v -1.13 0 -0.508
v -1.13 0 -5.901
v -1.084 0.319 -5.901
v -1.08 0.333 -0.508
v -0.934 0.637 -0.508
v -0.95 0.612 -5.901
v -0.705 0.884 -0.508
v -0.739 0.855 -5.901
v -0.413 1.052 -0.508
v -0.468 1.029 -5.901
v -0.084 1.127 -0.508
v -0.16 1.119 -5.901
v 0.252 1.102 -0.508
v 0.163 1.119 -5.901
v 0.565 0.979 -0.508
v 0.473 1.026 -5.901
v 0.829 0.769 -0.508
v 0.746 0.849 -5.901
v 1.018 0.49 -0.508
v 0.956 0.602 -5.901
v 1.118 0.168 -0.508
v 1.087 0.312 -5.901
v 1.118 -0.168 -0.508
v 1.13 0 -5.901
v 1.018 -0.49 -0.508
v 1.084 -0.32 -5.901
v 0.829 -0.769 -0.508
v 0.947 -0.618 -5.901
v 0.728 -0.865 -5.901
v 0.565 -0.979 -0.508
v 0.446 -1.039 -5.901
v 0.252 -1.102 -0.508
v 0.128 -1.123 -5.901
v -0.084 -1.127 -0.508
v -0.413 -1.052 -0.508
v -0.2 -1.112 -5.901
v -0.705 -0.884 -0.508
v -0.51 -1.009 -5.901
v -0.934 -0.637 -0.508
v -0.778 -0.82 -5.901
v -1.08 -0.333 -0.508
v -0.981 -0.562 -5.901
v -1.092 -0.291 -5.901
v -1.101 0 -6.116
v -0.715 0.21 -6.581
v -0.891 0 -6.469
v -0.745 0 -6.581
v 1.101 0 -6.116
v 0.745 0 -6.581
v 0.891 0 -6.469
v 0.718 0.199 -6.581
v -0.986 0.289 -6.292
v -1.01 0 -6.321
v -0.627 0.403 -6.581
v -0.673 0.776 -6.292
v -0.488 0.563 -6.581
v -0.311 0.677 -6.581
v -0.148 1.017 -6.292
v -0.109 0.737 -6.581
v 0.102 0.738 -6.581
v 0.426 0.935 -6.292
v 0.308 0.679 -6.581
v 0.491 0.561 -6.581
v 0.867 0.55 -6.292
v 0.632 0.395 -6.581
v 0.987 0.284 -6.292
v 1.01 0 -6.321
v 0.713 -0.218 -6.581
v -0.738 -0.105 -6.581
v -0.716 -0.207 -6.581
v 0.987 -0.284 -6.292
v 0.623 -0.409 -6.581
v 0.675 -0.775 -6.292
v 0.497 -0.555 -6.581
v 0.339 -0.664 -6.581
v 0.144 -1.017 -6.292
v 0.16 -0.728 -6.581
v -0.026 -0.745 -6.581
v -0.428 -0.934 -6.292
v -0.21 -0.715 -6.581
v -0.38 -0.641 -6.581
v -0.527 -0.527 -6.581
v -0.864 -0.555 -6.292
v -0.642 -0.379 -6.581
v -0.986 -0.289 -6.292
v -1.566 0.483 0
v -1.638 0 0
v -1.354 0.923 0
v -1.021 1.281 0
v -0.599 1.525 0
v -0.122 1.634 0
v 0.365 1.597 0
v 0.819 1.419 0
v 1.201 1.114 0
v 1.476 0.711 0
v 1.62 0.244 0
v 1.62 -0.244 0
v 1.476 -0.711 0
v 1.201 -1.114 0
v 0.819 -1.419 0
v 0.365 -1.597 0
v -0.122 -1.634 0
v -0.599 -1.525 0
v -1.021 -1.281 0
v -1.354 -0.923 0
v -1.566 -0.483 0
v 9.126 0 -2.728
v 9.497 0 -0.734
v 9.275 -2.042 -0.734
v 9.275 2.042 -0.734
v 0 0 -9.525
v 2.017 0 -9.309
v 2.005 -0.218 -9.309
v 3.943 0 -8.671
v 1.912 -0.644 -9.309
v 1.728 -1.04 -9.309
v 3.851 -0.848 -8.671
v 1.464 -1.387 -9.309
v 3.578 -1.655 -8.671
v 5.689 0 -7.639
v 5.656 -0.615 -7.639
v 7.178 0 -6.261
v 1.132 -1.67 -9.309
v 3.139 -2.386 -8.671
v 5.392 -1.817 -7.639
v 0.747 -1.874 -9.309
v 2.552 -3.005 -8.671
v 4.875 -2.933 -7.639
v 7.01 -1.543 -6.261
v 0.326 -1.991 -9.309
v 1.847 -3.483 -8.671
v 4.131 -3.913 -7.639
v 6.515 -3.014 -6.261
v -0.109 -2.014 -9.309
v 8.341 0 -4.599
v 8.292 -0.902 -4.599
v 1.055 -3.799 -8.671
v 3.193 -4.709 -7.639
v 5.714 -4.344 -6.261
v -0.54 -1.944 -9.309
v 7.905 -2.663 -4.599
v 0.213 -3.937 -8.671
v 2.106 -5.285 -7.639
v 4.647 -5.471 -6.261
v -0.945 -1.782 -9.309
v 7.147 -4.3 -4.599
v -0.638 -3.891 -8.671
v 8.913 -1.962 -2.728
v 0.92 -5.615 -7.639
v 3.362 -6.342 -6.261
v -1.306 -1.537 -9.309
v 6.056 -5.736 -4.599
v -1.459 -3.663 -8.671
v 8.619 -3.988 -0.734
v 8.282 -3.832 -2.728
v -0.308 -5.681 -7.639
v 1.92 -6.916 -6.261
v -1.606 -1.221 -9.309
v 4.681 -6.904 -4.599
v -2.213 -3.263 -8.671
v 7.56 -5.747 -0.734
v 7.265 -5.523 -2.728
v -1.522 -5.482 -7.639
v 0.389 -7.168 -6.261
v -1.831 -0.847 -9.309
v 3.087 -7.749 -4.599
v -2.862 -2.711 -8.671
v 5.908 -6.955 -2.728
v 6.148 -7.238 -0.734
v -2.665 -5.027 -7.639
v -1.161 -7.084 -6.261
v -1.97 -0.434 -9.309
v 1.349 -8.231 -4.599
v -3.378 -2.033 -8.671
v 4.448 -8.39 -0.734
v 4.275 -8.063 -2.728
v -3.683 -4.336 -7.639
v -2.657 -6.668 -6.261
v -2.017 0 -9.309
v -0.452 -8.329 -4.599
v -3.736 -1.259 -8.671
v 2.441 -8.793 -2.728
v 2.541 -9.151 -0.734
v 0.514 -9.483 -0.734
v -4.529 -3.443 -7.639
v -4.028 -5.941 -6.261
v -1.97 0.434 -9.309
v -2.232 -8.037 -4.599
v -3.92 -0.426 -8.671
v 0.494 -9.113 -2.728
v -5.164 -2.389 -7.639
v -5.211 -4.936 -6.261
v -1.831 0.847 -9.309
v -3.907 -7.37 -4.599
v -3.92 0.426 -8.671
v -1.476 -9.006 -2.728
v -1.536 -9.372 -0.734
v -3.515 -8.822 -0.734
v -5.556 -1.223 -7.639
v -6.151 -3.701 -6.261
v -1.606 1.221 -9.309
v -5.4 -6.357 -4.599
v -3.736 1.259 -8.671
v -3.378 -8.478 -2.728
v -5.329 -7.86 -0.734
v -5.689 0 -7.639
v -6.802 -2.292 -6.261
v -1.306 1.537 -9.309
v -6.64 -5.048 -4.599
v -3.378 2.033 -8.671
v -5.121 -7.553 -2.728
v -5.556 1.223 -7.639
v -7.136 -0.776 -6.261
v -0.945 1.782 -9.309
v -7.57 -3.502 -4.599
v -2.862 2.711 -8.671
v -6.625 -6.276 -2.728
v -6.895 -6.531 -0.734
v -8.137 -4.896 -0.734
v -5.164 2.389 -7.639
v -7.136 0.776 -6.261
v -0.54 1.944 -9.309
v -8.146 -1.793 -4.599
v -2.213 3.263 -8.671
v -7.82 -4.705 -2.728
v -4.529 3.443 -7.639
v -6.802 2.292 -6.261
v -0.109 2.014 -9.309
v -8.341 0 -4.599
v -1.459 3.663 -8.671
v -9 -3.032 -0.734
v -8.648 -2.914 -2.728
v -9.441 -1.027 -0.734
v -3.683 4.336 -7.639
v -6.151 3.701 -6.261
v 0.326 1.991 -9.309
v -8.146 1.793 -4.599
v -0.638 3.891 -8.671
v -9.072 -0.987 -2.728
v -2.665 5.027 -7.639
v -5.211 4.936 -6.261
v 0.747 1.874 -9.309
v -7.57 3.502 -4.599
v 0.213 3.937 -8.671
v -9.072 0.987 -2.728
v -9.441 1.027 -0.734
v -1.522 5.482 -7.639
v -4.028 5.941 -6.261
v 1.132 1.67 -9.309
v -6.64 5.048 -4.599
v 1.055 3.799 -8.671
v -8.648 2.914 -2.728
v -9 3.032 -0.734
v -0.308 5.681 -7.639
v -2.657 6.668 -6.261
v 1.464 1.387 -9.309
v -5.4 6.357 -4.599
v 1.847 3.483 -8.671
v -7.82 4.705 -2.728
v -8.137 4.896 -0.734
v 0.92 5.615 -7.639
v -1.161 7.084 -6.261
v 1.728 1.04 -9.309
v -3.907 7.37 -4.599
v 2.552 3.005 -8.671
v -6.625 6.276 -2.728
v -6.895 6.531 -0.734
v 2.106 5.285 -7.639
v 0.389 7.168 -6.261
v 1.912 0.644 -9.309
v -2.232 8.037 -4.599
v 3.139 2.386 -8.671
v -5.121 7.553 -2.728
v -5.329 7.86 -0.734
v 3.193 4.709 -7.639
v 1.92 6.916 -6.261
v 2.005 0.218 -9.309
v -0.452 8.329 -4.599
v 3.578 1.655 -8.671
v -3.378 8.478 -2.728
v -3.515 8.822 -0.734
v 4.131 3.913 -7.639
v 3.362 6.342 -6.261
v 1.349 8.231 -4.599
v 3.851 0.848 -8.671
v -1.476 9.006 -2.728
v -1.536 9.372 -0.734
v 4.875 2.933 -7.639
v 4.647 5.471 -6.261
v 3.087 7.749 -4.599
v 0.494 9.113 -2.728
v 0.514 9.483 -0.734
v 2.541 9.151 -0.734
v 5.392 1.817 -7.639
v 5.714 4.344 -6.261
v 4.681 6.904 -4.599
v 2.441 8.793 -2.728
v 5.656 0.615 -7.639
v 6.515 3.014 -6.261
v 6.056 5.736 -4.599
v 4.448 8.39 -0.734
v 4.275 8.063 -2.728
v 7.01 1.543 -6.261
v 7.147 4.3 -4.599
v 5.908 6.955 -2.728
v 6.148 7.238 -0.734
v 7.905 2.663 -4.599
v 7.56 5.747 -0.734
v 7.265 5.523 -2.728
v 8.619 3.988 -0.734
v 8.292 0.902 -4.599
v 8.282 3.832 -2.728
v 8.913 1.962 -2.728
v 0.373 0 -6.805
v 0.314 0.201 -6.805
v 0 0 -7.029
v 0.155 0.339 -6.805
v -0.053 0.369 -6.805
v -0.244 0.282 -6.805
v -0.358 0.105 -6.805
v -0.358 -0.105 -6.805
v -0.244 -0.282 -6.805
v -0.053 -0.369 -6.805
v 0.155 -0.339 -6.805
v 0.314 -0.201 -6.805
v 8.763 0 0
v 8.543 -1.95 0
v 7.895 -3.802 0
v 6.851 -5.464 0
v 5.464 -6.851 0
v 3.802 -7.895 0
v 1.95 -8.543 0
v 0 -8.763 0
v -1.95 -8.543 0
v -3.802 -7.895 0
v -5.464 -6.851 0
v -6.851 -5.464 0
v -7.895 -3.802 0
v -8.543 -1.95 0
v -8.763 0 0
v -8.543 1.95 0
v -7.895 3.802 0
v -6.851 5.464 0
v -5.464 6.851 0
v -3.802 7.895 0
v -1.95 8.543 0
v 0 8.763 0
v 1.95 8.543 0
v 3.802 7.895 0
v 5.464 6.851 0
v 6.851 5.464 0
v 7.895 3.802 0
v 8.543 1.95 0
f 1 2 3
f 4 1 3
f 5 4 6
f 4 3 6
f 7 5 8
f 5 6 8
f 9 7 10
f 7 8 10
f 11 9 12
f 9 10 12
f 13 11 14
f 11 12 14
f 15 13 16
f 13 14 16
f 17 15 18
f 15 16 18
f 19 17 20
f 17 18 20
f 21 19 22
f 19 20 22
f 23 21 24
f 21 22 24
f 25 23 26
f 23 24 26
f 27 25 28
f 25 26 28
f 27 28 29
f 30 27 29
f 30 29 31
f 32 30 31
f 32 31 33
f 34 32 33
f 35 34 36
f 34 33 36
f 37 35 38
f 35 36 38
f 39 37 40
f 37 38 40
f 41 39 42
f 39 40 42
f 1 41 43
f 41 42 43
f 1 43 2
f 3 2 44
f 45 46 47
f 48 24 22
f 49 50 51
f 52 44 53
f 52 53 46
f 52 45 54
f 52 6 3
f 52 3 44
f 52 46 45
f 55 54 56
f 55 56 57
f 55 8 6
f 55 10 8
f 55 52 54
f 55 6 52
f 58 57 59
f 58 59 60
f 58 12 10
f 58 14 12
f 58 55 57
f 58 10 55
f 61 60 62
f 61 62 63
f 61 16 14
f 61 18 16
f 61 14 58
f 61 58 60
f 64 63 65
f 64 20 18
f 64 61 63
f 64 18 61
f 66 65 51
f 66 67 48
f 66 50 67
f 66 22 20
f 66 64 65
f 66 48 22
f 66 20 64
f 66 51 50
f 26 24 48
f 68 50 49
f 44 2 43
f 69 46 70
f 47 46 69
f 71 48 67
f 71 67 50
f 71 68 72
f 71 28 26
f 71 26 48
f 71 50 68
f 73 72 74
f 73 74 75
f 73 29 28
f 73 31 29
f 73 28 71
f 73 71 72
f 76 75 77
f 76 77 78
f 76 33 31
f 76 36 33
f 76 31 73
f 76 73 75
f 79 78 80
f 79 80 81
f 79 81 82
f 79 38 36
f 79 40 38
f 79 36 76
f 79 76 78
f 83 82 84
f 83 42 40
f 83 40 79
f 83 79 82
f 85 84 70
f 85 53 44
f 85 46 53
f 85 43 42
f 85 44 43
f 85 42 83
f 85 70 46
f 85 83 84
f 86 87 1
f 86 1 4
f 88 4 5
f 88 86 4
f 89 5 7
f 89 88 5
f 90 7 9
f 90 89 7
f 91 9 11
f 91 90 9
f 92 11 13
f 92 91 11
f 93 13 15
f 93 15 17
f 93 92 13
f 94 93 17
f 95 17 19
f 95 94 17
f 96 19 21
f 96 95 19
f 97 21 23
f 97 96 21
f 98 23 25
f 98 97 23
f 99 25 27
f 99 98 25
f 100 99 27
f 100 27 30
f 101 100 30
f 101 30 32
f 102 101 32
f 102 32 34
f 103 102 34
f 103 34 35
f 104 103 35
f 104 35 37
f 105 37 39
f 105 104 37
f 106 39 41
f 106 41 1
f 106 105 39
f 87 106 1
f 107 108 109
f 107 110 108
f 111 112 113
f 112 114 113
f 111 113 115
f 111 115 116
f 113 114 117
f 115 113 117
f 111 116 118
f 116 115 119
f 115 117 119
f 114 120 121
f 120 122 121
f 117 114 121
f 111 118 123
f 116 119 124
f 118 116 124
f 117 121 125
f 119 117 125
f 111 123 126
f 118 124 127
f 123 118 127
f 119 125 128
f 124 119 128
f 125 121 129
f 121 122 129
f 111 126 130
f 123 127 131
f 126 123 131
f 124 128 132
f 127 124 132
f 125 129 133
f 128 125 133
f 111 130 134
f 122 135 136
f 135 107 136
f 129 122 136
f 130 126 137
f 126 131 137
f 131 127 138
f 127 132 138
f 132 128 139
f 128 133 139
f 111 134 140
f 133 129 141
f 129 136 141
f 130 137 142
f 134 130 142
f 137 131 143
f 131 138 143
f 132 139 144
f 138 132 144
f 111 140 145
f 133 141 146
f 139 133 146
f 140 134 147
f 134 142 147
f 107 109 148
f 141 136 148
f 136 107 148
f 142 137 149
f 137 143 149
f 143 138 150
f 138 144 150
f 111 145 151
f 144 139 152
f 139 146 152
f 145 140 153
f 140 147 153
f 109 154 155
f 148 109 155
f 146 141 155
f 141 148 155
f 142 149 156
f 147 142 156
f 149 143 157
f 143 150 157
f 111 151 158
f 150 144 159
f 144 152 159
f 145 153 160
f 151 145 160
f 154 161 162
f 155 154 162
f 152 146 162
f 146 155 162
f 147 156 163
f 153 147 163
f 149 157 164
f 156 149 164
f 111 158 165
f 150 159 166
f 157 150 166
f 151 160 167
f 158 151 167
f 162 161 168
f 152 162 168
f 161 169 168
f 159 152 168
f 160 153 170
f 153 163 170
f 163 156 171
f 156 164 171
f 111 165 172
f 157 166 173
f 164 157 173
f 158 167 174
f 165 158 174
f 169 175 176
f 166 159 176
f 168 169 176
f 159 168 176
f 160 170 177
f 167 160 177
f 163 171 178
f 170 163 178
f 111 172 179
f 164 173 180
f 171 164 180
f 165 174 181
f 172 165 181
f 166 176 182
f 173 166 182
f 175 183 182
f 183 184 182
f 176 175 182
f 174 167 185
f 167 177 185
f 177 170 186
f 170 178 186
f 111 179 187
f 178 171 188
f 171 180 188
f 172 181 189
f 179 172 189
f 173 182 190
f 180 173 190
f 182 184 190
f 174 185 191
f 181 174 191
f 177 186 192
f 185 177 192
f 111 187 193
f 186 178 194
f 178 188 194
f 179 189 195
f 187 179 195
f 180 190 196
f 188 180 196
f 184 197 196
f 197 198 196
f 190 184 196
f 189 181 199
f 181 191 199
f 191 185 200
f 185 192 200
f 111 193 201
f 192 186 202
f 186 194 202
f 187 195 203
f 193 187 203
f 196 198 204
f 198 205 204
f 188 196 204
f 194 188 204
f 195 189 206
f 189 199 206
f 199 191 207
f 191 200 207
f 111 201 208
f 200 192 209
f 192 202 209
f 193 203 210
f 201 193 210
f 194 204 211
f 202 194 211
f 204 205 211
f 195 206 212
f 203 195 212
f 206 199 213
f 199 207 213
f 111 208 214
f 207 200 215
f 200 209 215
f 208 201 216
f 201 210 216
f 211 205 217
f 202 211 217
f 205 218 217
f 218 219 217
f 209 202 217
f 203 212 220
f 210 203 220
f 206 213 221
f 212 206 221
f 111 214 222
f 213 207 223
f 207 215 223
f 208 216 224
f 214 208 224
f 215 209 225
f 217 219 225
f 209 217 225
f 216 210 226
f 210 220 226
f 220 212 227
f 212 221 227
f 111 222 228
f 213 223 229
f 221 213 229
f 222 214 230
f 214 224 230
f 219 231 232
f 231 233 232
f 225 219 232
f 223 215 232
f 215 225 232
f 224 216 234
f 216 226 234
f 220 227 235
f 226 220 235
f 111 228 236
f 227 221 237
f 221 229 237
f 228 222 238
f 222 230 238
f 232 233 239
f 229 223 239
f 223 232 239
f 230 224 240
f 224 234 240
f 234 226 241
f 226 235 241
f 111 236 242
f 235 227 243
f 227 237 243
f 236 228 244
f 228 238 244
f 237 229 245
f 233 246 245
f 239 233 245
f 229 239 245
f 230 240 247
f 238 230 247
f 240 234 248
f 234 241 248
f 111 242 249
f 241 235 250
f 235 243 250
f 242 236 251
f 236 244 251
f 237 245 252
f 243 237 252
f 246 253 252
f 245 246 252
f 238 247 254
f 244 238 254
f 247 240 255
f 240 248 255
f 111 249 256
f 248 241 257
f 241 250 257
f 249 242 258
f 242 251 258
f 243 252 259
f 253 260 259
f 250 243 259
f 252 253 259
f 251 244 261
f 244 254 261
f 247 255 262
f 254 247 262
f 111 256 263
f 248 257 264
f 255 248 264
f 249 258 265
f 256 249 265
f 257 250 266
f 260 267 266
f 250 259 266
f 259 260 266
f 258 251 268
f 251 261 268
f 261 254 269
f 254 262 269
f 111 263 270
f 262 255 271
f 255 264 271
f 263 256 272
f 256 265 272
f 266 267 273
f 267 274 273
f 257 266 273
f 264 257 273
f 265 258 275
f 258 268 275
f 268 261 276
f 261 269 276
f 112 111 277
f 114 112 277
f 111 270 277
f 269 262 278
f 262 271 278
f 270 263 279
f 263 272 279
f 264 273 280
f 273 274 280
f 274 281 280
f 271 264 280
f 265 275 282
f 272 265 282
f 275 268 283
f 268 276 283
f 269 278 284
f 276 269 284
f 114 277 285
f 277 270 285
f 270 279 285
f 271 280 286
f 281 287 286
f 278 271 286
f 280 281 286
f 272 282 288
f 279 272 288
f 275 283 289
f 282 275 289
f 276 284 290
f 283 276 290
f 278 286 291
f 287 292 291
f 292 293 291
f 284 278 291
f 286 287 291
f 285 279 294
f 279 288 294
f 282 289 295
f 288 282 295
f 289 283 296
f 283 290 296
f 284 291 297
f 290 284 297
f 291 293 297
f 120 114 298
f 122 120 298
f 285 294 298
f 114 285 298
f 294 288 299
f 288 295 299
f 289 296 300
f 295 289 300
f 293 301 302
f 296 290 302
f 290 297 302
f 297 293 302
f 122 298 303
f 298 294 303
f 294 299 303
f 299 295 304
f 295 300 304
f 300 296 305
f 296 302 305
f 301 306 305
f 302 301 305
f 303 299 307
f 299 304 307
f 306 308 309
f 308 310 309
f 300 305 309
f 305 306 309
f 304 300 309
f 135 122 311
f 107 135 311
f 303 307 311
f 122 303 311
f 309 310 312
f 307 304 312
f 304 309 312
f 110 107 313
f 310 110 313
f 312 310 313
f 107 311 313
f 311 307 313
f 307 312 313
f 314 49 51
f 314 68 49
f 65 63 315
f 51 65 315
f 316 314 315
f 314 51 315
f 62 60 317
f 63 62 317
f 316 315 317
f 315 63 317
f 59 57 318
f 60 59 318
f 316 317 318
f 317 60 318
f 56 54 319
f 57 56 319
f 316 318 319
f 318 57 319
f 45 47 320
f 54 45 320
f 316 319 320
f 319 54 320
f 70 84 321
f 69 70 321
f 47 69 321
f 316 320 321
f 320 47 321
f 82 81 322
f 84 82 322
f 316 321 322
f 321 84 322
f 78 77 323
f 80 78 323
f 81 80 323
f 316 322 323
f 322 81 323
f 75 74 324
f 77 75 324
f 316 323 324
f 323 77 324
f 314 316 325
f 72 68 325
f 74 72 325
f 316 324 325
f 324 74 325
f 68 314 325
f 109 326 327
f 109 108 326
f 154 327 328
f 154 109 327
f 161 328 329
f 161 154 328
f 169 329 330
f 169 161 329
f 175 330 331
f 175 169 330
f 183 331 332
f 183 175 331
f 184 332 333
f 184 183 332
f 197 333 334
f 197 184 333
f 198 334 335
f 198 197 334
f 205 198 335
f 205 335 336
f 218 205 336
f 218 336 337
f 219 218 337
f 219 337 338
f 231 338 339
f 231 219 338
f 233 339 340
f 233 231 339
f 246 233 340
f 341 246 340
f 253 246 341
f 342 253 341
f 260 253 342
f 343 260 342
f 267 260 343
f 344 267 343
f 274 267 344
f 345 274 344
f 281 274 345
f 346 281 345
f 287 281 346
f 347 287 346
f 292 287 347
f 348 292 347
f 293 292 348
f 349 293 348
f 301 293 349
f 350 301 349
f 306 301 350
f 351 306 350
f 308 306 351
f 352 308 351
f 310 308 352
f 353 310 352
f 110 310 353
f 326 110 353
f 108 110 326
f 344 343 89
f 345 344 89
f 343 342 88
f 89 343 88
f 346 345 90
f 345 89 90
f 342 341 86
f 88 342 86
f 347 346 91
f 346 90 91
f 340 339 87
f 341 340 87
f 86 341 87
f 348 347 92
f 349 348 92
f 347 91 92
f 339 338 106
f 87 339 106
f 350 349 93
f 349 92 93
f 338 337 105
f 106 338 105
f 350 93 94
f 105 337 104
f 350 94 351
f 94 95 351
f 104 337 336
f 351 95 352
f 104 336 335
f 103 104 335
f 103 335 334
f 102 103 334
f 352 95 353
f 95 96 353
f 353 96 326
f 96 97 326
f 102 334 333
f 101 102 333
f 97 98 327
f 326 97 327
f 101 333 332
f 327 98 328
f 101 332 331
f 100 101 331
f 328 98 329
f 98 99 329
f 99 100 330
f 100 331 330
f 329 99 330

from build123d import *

# Parameters (mm, degrees)
F_4_40_TAPPED_HOLE1_D     = 2.2606
F_4_40_TAPPED_HOLE1_DEPTH = 6.35
F_4_40_TAPPED_HOLE1_TIP   = 0.679152758
FILLET1_R                 = 0.79375
CHAMFER1_SIZE             = 0.762
CHAMFER2_SIZE             = 0.508


with BuildPart() as part:
    # Sketch1 → Revolve1 (revolve)
    with BuildSketch(Plane(origin=(0, 0, 0), x_dir=(1, 0, 0), z_dir=(0, 1, 0))):
        with BuildLine():
            Line((0, 0), (0, 9.525))
            ThreePointArc((0, 9.525), (6.735192091, 6.735192091), (9.525, 0))
            Line((9.525, 0), (0, 0))
        make_face()
    revolve(axis=Axis((0, 0, 0), (0, 0, -1)))

    # #4-40 Tapped Hole1
    with Locations(Plane.XY):
        with Locations((0, 0)):
            Hole(F_4_40_TAPPED_HOLE1_D / 2, depth=F_4_40_TAPPED_HOLE1_DEPTH)
            with Locations((0, 0, -(F_4_40_TAPPED_HOLE1_DEPTH + F_4_40_TAPPED_HOLE1_TIP / 2))):  # 118° drill point
                Cone(0, F_4_40_TAPPED_HOLE1_D / 2, F_4_40_TAPPED_HOLE1_TIP, mode=Mode.SUBTRACT)

    # Fillet1
    fillet1_edges = [part.edges().sort_by_distance(p)[0] for p in [
        (0, 1.1303, -6.35),
    ]]
    fillet(fillet1_edges, radius=FILLET1_R)

    # Chamfer1
    # the kernel refuses this chamfer: 0.762 mm, written as the material it takes off along each edge
    with BuildSketch(Plane(origin=(0, 0, 0), x_dir=(1, 0, 0), z_dir=(0, 1, 0))) as chamfer1_piece_1:
        with BuildLine():
            Line((9.525 - CHAMFER1_SIZE, 0), (9.496699923, 0.733699923))
            ThreePointArc((9.496699923, 0.733699923), (9.517517871, 0.37746333), (9.525, 0))
            Line((9.525, 0), (9.525 - CHAMFER1_SIZE, 0))
        make_face()
    revolve(axis=Axis((0, 0, 0), (0, 0, -1)), mode=Mode.SUBTRACT)

    # Chamfer2
    chamfer2_edges = [part.edges().sort_by_distance(p)[0] for p in [
        (1.1303, 0, 0),
    ]]
    chamfer(chamfer2_edges, length=CHAMFER2_SIZE)


solid = part.part
